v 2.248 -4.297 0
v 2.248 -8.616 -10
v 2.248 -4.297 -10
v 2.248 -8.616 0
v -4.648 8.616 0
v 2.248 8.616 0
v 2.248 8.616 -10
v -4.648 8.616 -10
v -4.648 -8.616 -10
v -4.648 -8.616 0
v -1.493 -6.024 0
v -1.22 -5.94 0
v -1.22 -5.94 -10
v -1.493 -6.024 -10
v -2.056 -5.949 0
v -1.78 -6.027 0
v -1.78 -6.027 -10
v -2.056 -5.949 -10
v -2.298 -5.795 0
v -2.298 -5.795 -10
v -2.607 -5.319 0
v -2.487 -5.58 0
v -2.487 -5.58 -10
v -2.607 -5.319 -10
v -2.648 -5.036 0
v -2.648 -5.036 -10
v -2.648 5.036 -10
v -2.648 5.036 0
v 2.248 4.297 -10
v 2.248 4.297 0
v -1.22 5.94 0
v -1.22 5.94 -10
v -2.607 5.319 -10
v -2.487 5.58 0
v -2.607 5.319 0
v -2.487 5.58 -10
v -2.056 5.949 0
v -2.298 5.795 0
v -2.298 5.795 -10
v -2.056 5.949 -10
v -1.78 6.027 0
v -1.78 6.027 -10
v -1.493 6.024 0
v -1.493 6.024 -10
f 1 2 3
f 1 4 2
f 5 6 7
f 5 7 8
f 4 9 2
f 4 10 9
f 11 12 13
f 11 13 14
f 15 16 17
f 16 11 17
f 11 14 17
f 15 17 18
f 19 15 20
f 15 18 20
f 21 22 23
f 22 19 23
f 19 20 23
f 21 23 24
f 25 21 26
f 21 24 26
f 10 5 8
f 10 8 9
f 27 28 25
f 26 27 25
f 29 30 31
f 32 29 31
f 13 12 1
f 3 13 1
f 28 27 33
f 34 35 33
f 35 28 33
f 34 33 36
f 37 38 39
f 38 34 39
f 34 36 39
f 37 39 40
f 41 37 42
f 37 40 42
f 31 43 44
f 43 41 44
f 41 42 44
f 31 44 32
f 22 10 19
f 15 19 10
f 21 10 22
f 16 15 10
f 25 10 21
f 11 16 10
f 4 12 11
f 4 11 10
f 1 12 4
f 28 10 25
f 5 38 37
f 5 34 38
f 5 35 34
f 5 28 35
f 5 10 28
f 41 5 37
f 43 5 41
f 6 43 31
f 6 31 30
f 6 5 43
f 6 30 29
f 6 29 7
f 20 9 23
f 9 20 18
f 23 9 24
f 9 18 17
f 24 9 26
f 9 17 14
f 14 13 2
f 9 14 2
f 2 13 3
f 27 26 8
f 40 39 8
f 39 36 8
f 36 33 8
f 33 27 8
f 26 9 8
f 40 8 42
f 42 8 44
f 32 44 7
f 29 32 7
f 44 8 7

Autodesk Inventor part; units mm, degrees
ref_plane "YZ Plane" through (0, 0, 0) normal (1, 0, 0) x (0, 1, 0)
ref_plane "XZ Plane" through (0, 0, 0) normal (0, 1, 0) x (-1, 0, 0)
ref_plane "XY Plane" through (0, 0, 0) normal (0, 0, 1) x (1, 0, 0)
sketch "Sketch1" plane through (0, 0, 0) normal (0, 0, 1) x (1, 0, 0)
  circle A0 centre (2.8524, -17.9) radius 2 projected
  circle A1 centre (18.8524, -17.9) radius 2 projected
  circle A2 centre (18.8524, 17.9) radius 2 projected
  circle A3 centre (2.8524, 17.9) radius 2 projected
  arc A4 (3.1135, 5.1575) -> (3.0054, 10.8589) centre (-1.0472, 7.9303) ccw projected
  arc A5 (3.1135, 5.1575) -> (2.4476, 3.9812) centre (10.8524, 0) ccw projected
  line L0 (2.4476, 3.9812) -> (-1.0195, 5.6235) projected
  line L1 (-2.4476, 4.7198) -> (-2.4476, -4.7198) projected
  line L2 (-1.0195, -5.6235) -> (2.4476, -3.9812) projected
  arc A6 (2.4476, -3.9812) -> (3.1135, -5.1575) centre (10.8524, 0) ccw projected
  arc A7 (3.0054, -10.8589) -> (3.1135, -5.1575) centre (-1.0472, -7.9303) ccw projected
  line L3 (-0.3897, -15.5572) -> (3.0054, -10.8589) projected
  arc A8 (-0.3897, -15.5572) -> (6.4079, -19.7325) centre (2.8524, -17.9) ccw projected
  arc A9 (15.2968, -19.7325) -> (6.4079, -19.7325) centre (10.8524, -22.0231) ccw projected
  arc A10 (15.2968, -19.7325) -> (22.0945, -15.5572) centre (18.8524, -17.9) ccw projected
  line L4 (22.0945, -15.5572) -> (18.6993, -10.8589) projected
  arc A11 (18.3102, -5.6345) -> (18.6993, -10.8589) centre (22.752, -7.9303) ccw projected
  line L5 (32.1524, -5.6345) -> (18.3102, -5.6345) projected
  line L6 (32.1524, 5.6345) -> (32.1524, -5.6345) projected
  line L7 (32.1524, 5.6345) -> (18.3102, 5.6345) projected
  arc A12 (18.6993, 10.8589) -> (18.3102, 5.6345) centre (22.752, 7.9303) ccw projected
  line L8 (18.6993, 10.8589) -> (22.0945, 15.5572) projected
  arc A13 (22.0945, 15.5572) -> (15.2968, 19.7325) centre (18.8524, 17.9) ccw projected
  arc A14 (6.4079, 19.7325) -> (15.2968, 19.7325) centre (10.8524, 22.0231) ccw projected
  arc A15 (6.4079, 19.7325) -> (-0.3897, 15.5572) centre (2.8524, 17.9) ccw projected
  line L9 (3.0054, 10.8589) -> (-0.3897, 15.5572) projected
  circle A16 centre (10.8524, 0) radius 1.5 projected
  line L10 (2.2476, 4.2972) -> (-2.6476, 6.616)
  line L11 (-2.6476, 6.616) -> (-2.6476, -6.616)
  line L12 (-2.6476, -6.616) -> (2.2476, -4.2972)
  line L13 (0, 0) -> (10.8524, 0) construction
  line L14 (2.2476, 4.2972) -> (2.2476, 8.616)
  line L15 (2.2476, 8.616) -> (-4.6476, 8.616)
  line L16 (-4.6476, 8.616) -> (-4.6476, -8.616)
  line L17 (-4.6476, -8.616) -> (2.2476, -8.616)
  line L18 (2.2476, -8.616) -> (2.2476, -4.2972)
  arc A17 (-2.4476, -4.7198) -> (-1.0195, -5.6235) centre (-1.4476, -4.7198) ccw projected
  arc A18 (-1.0195, 5.6235) -> (-2.4476, 4.7198) centre (-1.4476, 4.7198) ccw projected
  dimension "d0" = 0.2
  dimension "d1" = 0.2
  dimension "d2" = 0.2
  dimension "d3" = 2
  dimension "d4" = 2
extrude "Extrusion1" add sketch "Sketch1" against normal blind 10 contours L10 L11 L12 L18 L17 L16 L15 L14
fillet "Fillet1" radius 1 2 edges at (-2.6476, -6.616, -5) (-2.6476, 6.616, -5)
properties part number "dovetail insert"
